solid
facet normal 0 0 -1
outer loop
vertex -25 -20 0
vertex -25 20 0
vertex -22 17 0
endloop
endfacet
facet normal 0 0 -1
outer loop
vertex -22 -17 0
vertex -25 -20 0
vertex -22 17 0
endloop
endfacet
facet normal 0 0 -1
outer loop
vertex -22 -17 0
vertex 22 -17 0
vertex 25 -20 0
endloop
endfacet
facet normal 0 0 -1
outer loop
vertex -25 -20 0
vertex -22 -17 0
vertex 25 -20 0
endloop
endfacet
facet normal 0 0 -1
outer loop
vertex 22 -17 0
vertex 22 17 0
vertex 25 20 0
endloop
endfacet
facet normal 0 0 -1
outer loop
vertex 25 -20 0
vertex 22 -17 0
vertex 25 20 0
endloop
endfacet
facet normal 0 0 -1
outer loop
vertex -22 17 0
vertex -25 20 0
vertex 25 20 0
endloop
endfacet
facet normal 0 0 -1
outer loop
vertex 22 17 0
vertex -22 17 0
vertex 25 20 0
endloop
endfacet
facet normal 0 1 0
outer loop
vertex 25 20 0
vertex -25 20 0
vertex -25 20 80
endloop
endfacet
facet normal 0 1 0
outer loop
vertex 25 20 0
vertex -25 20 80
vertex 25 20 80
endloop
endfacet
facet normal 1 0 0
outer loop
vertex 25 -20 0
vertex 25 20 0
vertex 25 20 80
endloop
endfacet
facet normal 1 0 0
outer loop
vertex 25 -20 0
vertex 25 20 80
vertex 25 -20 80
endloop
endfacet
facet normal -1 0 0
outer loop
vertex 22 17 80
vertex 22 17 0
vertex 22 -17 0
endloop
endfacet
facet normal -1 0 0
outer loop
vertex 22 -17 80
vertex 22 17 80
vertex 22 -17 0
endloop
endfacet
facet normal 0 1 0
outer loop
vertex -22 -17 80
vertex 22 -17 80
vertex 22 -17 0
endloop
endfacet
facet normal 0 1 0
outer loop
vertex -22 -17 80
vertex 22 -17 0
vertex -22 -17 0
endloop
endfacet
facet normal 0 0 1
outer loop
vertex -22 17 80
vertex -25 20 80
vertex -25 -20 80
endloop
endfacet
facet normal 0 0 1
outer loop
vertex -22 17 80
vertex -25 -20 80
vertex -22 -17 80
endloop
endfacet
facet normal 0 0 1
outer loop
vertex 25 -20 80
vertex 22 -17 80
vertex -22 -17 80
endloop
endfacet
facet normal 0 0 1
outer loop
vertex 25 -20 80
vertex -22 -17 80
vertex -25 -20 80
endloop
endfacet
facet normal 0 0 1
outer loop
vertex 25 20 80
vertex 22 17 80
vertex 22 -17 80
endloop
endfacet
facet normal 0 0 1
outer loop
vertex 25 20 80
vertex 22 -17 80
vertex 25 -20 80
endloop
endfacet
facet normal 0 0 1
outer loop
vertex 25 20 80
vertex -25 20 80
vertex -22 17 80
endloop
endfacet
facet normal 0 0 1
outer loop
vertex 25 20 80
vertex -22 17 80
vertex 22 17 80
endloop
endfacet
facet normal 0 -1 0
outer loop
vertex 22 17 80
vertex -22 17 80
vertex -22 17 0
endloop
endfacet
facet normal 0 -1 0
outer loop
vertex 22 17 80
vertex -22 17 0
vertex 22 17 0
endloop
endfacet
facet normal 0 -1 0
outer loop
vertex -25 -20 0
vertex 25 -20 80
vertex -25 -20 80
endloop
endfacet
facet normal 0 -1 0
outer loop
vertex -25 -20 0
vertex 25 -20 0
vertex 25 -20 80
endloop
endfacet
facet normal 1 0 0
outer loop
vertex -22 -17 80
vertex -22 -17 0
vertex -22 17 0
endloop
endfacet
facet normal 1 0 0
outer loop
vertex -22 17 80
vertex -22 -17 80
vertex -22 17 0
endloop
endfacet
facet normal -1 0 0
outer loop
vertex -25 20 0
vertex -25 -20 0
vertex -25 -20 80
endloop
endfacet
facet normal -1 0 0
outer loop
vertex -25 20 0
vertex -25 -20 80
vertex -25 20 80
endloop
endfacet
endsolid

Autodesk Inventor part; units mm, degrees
ref_plane "YZ Plane" through (0, 0, 0) normal (1, 0, 0) x (0, 1, 0)
ref_plane "XZ Plane" through (0, 0, 0) normal (0, 1, 0) x (-1, 0, 0)
ref_plane "XY Plane" through (0, 0, 0) normal (0, 0, 1) x (1, 0, 0)
sketch "Sketch1" plane through (0, 0, 0) normal (0, 0, 1) x (1, 0, 0)
  point P0 (0, 0)
sketch "Sketch2" plane through (0, 0, 0) normal (0, 0, 1) x (1, 0, 0)
  line L0 (22, -17) -> (-22, -17)
  line L1 (-22, -17) -> (-22, 17)
  line L2 (-22, 17) -> (22, 17)
  line L3 (22, 17) -> (22, -17)
  line L4 (22, -17) -> (-22, 17) construction
  line L5 (-22, -17) -> (22, 17) construction
  line L6 (25.0001, -20) -> (-25.0001, -20)
  line L7 (-25.0001, -20) -> (-25.0001, 20)
  line L8 (-25.0001, 20) -> (25.0001, 20)
  line L9 (25.0001, 20) -> (25.0001, -20)
  line L10 (25.0001, -20) -> (-25.0001, 20) construction
  line L11 (-25.0001, -20) -> (25.0001, 20) construction
  point P0 (0, 0)
extrude "Extrusion1" add sketch "Sketch2" along normal blind 80
properties part number "enclosure_80x40x50_mm"
